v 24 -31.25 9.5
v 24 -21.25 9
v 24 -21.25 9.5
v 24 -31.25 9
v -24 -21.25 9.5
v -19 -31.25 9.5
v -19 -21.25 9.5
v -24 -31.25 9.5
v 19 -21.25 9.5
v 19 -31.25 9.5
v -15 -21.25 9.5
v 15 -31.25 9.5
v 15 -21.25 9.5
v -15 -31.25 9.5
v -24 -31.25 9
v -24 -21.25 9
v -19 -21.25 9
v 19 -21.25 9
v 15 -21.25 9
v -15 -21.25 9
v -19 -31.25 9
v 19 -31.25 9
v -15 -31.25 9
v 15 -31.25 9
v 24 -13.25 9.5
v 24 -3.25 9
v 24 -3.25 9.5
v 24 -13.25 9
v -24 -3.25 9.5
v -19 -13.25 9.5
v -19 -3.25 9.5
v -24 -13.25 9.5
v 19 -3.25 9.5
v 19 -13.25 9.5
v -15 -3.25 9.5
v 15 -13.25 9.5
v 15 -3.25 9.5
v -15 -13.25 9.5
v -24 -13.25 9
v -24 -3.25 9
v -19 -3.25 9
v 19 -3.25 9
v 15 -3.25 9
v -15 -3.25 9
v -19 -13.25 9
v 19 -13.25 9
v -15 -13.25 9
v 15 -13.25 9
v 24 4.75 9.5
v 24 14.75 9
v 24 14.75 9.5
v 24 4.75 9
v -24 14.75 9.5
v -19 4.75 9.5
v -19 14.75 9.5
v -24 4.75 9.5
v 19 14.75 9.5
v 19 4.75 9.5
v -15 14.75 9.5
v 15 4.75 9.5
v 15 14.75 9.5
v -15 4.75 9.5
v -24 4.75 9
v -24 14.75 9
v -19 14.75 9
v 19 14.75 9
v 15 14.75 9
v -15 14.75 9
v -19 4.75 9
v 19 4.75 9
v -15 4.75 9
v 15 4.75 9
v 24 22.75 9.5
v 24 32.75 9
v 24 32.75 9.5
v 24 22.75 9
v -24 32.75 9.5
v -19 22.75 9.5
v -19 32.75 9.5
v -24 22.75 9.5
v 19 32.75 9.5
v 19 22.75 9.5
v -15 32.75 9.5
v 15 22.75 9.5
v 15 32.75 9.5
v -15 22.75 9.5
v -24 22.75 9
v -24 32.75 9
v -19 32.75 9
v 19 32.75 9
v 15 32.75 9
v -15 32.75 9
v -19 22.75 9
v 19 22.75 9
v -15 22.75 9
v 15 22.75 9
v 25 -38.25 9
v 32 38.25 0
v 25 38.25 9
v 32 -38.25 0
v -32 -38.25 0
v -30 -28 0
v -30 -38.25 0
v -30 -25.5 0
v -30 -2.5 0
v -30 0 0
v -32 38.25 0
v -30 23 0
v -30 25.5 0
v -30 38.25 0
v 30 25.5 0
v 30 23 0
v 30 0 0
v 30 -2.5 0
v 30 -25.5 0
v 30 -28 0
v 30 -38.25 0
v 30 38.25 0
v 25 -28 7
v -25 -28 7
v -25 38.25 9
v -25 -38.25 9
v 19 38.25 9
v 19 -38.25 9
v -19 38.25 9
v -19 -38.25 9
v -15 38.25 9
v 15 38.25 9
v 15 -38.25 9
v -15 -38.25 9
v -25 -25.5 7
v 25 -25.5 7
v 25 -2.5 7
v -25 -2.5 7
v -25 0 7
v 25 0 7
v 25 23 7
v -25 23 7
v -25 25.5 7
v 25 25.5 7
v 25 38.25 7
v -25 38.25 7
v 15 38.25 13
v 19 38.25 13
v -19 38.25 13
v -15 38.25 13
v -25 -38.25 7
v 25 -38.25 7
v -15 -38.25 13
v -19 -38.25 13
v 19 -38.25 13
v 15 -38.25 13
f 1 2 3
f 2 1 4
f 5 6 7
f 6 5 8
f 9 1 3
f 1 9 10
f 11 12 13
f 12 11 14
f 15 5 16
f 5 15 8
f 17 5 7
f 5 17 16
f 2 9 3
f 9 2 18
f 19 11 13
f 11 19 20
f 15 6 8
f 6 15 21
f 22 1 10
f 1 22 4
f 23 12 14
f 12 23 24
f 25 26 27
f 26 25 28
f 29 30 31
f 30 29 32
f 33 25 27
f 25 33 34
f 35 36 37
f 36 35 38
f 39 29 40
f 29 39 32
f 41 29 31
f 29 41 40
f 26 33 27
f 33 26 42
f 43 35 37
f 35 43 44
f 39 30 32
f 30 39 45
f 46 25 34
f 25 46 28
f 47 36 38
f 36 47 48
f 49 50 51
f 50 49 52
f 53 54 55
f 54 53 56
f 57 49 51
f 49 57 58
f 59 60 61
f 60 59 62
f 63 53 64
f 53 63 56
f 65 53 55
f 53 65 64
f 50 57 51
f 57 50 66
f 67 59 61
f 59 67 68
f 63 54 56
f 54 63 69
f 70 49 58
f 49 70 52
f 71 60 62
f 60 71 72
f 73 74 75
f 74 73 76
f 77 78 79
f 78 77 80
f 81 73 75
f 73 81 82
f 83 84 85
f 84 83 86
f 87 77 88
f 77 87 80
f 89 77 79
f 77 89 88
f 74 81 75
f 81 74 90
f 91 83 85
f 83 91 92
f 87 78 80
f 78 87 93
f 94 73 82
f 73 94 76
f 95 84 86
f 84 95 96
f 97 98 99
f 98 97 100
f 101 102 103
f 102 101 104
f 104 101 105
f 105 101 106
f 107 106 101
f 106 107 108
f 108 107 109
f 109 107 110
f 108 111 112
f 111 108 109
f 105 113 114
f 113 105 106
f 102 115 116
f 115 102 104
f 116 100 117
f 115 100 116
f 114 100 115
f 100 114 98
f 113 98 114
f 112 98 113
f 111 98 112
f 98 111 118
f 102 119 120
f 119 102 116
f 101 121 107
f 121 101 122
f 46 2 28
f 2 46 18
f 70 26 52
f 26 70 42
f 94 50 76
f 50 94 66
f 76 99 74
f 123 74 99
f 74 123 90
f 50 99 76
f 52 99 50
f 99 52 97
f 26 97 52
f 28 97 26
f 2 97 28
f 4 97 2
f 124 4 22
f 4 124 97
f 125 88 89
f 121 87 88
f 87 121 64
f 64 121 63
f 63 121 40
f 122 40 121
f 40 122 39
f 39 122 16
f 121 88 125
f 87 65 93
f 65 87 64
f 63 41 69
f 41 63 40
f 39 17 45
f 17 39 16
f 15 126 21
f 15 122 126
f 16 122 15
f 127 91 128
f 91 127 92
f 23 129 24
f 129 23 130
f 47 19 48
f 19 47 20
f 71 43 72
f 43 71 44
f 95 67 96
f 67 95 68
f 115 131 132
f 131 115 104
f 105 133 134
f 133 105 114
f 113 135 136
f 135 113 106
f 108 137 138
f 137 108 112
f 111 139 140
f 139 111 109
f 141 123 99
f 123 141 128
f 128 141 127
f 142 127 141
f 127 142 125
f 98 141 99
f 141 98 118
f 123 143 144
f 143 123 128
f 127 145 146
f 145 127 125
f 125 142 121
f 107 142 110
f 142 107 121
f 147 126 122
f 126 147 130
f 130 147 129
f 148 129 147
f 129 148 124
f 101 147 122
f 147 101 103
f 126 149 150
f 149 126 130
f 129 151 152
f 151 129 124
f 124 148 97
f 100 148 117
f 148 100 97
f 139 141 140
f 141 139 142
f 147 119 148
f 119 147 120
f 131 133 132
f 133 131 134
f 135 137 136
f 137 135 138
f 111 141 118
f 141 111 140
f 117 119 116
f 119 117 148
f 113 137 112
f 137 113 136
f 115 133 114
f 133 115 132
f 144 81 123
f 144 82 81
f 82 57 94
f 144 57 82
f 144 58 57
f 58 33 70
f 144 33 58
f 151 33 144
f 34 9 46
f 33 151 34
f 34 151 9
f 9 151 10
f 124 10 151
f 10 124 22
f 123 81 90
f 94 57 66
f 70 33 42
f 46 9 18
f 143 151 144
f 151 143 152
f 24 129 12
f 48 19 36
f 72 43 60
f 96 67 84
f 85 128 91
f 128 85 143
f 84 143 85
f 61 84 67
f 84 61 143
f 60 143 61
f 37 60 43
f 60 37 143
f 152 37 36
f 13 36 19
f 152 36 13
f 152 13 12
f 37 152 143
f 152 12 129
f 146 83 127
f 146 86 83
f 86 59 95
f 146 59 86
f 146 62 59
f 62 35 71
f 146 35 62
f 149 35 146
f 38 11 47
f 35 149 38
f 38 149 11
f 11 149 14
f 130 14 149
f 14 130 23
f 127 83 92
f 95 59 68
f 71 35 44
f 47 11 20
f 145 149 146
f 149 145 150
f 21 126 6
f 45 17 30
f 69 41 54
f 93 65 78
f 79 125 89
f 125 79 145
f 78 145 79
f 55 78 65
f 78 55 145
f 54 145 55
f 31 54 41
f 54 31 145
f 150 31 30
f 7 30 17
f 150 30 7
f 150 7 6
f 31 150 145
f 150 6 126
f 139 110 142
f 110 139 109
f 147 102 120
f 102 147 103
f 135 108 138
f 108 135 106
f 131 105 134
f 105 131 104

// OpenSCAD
//
// Curved track, made to be compatible with Geotrax®
// (Work in progress : no join system between tracks)
// Author: Francois Crevola (francois@crevola.org)
//

long = 76.5;

// main piece
	rotate([90,0,0])
	translate([0, 0, -long/2]) // center
	linear_extrude(height=long)
		polygon(points=[[0,7],[-25,7],[-30,0],[-32,0],[-25,9],[-19,9],[-19,13],[-15,13],[-15,9],[15,9],[15,13],[19,13],[19,9],[25,9],[32,0],[30,0],[25,7]], paths=[[0,1,2,3,4,5,6,7,8,9,10,11,12,13,14,15,16,17,18,19,20]]);


// + traverses
spacing = 18;
max = 4;
delta = 6;
for (i = [1:max]) // n iterations
{
	translate([0,-long/2+(i*spacing)-delta,9])
	cube(size = [48, 10, 1], center = true);
}

// + supports
for (i = [-1, 0, 1]) {
	translate([0,i*(long/3),0])
	rotate([90,0,0])
	linear_extrude(height=2.5)
		polygon(points=[[-32,0],[-25,9],[25,9],[32,0]], paths=[[0,1,2,3,4,5,6,7,8,9,10,11,12,13,14,15,16,17,18,19,20]]);
}
